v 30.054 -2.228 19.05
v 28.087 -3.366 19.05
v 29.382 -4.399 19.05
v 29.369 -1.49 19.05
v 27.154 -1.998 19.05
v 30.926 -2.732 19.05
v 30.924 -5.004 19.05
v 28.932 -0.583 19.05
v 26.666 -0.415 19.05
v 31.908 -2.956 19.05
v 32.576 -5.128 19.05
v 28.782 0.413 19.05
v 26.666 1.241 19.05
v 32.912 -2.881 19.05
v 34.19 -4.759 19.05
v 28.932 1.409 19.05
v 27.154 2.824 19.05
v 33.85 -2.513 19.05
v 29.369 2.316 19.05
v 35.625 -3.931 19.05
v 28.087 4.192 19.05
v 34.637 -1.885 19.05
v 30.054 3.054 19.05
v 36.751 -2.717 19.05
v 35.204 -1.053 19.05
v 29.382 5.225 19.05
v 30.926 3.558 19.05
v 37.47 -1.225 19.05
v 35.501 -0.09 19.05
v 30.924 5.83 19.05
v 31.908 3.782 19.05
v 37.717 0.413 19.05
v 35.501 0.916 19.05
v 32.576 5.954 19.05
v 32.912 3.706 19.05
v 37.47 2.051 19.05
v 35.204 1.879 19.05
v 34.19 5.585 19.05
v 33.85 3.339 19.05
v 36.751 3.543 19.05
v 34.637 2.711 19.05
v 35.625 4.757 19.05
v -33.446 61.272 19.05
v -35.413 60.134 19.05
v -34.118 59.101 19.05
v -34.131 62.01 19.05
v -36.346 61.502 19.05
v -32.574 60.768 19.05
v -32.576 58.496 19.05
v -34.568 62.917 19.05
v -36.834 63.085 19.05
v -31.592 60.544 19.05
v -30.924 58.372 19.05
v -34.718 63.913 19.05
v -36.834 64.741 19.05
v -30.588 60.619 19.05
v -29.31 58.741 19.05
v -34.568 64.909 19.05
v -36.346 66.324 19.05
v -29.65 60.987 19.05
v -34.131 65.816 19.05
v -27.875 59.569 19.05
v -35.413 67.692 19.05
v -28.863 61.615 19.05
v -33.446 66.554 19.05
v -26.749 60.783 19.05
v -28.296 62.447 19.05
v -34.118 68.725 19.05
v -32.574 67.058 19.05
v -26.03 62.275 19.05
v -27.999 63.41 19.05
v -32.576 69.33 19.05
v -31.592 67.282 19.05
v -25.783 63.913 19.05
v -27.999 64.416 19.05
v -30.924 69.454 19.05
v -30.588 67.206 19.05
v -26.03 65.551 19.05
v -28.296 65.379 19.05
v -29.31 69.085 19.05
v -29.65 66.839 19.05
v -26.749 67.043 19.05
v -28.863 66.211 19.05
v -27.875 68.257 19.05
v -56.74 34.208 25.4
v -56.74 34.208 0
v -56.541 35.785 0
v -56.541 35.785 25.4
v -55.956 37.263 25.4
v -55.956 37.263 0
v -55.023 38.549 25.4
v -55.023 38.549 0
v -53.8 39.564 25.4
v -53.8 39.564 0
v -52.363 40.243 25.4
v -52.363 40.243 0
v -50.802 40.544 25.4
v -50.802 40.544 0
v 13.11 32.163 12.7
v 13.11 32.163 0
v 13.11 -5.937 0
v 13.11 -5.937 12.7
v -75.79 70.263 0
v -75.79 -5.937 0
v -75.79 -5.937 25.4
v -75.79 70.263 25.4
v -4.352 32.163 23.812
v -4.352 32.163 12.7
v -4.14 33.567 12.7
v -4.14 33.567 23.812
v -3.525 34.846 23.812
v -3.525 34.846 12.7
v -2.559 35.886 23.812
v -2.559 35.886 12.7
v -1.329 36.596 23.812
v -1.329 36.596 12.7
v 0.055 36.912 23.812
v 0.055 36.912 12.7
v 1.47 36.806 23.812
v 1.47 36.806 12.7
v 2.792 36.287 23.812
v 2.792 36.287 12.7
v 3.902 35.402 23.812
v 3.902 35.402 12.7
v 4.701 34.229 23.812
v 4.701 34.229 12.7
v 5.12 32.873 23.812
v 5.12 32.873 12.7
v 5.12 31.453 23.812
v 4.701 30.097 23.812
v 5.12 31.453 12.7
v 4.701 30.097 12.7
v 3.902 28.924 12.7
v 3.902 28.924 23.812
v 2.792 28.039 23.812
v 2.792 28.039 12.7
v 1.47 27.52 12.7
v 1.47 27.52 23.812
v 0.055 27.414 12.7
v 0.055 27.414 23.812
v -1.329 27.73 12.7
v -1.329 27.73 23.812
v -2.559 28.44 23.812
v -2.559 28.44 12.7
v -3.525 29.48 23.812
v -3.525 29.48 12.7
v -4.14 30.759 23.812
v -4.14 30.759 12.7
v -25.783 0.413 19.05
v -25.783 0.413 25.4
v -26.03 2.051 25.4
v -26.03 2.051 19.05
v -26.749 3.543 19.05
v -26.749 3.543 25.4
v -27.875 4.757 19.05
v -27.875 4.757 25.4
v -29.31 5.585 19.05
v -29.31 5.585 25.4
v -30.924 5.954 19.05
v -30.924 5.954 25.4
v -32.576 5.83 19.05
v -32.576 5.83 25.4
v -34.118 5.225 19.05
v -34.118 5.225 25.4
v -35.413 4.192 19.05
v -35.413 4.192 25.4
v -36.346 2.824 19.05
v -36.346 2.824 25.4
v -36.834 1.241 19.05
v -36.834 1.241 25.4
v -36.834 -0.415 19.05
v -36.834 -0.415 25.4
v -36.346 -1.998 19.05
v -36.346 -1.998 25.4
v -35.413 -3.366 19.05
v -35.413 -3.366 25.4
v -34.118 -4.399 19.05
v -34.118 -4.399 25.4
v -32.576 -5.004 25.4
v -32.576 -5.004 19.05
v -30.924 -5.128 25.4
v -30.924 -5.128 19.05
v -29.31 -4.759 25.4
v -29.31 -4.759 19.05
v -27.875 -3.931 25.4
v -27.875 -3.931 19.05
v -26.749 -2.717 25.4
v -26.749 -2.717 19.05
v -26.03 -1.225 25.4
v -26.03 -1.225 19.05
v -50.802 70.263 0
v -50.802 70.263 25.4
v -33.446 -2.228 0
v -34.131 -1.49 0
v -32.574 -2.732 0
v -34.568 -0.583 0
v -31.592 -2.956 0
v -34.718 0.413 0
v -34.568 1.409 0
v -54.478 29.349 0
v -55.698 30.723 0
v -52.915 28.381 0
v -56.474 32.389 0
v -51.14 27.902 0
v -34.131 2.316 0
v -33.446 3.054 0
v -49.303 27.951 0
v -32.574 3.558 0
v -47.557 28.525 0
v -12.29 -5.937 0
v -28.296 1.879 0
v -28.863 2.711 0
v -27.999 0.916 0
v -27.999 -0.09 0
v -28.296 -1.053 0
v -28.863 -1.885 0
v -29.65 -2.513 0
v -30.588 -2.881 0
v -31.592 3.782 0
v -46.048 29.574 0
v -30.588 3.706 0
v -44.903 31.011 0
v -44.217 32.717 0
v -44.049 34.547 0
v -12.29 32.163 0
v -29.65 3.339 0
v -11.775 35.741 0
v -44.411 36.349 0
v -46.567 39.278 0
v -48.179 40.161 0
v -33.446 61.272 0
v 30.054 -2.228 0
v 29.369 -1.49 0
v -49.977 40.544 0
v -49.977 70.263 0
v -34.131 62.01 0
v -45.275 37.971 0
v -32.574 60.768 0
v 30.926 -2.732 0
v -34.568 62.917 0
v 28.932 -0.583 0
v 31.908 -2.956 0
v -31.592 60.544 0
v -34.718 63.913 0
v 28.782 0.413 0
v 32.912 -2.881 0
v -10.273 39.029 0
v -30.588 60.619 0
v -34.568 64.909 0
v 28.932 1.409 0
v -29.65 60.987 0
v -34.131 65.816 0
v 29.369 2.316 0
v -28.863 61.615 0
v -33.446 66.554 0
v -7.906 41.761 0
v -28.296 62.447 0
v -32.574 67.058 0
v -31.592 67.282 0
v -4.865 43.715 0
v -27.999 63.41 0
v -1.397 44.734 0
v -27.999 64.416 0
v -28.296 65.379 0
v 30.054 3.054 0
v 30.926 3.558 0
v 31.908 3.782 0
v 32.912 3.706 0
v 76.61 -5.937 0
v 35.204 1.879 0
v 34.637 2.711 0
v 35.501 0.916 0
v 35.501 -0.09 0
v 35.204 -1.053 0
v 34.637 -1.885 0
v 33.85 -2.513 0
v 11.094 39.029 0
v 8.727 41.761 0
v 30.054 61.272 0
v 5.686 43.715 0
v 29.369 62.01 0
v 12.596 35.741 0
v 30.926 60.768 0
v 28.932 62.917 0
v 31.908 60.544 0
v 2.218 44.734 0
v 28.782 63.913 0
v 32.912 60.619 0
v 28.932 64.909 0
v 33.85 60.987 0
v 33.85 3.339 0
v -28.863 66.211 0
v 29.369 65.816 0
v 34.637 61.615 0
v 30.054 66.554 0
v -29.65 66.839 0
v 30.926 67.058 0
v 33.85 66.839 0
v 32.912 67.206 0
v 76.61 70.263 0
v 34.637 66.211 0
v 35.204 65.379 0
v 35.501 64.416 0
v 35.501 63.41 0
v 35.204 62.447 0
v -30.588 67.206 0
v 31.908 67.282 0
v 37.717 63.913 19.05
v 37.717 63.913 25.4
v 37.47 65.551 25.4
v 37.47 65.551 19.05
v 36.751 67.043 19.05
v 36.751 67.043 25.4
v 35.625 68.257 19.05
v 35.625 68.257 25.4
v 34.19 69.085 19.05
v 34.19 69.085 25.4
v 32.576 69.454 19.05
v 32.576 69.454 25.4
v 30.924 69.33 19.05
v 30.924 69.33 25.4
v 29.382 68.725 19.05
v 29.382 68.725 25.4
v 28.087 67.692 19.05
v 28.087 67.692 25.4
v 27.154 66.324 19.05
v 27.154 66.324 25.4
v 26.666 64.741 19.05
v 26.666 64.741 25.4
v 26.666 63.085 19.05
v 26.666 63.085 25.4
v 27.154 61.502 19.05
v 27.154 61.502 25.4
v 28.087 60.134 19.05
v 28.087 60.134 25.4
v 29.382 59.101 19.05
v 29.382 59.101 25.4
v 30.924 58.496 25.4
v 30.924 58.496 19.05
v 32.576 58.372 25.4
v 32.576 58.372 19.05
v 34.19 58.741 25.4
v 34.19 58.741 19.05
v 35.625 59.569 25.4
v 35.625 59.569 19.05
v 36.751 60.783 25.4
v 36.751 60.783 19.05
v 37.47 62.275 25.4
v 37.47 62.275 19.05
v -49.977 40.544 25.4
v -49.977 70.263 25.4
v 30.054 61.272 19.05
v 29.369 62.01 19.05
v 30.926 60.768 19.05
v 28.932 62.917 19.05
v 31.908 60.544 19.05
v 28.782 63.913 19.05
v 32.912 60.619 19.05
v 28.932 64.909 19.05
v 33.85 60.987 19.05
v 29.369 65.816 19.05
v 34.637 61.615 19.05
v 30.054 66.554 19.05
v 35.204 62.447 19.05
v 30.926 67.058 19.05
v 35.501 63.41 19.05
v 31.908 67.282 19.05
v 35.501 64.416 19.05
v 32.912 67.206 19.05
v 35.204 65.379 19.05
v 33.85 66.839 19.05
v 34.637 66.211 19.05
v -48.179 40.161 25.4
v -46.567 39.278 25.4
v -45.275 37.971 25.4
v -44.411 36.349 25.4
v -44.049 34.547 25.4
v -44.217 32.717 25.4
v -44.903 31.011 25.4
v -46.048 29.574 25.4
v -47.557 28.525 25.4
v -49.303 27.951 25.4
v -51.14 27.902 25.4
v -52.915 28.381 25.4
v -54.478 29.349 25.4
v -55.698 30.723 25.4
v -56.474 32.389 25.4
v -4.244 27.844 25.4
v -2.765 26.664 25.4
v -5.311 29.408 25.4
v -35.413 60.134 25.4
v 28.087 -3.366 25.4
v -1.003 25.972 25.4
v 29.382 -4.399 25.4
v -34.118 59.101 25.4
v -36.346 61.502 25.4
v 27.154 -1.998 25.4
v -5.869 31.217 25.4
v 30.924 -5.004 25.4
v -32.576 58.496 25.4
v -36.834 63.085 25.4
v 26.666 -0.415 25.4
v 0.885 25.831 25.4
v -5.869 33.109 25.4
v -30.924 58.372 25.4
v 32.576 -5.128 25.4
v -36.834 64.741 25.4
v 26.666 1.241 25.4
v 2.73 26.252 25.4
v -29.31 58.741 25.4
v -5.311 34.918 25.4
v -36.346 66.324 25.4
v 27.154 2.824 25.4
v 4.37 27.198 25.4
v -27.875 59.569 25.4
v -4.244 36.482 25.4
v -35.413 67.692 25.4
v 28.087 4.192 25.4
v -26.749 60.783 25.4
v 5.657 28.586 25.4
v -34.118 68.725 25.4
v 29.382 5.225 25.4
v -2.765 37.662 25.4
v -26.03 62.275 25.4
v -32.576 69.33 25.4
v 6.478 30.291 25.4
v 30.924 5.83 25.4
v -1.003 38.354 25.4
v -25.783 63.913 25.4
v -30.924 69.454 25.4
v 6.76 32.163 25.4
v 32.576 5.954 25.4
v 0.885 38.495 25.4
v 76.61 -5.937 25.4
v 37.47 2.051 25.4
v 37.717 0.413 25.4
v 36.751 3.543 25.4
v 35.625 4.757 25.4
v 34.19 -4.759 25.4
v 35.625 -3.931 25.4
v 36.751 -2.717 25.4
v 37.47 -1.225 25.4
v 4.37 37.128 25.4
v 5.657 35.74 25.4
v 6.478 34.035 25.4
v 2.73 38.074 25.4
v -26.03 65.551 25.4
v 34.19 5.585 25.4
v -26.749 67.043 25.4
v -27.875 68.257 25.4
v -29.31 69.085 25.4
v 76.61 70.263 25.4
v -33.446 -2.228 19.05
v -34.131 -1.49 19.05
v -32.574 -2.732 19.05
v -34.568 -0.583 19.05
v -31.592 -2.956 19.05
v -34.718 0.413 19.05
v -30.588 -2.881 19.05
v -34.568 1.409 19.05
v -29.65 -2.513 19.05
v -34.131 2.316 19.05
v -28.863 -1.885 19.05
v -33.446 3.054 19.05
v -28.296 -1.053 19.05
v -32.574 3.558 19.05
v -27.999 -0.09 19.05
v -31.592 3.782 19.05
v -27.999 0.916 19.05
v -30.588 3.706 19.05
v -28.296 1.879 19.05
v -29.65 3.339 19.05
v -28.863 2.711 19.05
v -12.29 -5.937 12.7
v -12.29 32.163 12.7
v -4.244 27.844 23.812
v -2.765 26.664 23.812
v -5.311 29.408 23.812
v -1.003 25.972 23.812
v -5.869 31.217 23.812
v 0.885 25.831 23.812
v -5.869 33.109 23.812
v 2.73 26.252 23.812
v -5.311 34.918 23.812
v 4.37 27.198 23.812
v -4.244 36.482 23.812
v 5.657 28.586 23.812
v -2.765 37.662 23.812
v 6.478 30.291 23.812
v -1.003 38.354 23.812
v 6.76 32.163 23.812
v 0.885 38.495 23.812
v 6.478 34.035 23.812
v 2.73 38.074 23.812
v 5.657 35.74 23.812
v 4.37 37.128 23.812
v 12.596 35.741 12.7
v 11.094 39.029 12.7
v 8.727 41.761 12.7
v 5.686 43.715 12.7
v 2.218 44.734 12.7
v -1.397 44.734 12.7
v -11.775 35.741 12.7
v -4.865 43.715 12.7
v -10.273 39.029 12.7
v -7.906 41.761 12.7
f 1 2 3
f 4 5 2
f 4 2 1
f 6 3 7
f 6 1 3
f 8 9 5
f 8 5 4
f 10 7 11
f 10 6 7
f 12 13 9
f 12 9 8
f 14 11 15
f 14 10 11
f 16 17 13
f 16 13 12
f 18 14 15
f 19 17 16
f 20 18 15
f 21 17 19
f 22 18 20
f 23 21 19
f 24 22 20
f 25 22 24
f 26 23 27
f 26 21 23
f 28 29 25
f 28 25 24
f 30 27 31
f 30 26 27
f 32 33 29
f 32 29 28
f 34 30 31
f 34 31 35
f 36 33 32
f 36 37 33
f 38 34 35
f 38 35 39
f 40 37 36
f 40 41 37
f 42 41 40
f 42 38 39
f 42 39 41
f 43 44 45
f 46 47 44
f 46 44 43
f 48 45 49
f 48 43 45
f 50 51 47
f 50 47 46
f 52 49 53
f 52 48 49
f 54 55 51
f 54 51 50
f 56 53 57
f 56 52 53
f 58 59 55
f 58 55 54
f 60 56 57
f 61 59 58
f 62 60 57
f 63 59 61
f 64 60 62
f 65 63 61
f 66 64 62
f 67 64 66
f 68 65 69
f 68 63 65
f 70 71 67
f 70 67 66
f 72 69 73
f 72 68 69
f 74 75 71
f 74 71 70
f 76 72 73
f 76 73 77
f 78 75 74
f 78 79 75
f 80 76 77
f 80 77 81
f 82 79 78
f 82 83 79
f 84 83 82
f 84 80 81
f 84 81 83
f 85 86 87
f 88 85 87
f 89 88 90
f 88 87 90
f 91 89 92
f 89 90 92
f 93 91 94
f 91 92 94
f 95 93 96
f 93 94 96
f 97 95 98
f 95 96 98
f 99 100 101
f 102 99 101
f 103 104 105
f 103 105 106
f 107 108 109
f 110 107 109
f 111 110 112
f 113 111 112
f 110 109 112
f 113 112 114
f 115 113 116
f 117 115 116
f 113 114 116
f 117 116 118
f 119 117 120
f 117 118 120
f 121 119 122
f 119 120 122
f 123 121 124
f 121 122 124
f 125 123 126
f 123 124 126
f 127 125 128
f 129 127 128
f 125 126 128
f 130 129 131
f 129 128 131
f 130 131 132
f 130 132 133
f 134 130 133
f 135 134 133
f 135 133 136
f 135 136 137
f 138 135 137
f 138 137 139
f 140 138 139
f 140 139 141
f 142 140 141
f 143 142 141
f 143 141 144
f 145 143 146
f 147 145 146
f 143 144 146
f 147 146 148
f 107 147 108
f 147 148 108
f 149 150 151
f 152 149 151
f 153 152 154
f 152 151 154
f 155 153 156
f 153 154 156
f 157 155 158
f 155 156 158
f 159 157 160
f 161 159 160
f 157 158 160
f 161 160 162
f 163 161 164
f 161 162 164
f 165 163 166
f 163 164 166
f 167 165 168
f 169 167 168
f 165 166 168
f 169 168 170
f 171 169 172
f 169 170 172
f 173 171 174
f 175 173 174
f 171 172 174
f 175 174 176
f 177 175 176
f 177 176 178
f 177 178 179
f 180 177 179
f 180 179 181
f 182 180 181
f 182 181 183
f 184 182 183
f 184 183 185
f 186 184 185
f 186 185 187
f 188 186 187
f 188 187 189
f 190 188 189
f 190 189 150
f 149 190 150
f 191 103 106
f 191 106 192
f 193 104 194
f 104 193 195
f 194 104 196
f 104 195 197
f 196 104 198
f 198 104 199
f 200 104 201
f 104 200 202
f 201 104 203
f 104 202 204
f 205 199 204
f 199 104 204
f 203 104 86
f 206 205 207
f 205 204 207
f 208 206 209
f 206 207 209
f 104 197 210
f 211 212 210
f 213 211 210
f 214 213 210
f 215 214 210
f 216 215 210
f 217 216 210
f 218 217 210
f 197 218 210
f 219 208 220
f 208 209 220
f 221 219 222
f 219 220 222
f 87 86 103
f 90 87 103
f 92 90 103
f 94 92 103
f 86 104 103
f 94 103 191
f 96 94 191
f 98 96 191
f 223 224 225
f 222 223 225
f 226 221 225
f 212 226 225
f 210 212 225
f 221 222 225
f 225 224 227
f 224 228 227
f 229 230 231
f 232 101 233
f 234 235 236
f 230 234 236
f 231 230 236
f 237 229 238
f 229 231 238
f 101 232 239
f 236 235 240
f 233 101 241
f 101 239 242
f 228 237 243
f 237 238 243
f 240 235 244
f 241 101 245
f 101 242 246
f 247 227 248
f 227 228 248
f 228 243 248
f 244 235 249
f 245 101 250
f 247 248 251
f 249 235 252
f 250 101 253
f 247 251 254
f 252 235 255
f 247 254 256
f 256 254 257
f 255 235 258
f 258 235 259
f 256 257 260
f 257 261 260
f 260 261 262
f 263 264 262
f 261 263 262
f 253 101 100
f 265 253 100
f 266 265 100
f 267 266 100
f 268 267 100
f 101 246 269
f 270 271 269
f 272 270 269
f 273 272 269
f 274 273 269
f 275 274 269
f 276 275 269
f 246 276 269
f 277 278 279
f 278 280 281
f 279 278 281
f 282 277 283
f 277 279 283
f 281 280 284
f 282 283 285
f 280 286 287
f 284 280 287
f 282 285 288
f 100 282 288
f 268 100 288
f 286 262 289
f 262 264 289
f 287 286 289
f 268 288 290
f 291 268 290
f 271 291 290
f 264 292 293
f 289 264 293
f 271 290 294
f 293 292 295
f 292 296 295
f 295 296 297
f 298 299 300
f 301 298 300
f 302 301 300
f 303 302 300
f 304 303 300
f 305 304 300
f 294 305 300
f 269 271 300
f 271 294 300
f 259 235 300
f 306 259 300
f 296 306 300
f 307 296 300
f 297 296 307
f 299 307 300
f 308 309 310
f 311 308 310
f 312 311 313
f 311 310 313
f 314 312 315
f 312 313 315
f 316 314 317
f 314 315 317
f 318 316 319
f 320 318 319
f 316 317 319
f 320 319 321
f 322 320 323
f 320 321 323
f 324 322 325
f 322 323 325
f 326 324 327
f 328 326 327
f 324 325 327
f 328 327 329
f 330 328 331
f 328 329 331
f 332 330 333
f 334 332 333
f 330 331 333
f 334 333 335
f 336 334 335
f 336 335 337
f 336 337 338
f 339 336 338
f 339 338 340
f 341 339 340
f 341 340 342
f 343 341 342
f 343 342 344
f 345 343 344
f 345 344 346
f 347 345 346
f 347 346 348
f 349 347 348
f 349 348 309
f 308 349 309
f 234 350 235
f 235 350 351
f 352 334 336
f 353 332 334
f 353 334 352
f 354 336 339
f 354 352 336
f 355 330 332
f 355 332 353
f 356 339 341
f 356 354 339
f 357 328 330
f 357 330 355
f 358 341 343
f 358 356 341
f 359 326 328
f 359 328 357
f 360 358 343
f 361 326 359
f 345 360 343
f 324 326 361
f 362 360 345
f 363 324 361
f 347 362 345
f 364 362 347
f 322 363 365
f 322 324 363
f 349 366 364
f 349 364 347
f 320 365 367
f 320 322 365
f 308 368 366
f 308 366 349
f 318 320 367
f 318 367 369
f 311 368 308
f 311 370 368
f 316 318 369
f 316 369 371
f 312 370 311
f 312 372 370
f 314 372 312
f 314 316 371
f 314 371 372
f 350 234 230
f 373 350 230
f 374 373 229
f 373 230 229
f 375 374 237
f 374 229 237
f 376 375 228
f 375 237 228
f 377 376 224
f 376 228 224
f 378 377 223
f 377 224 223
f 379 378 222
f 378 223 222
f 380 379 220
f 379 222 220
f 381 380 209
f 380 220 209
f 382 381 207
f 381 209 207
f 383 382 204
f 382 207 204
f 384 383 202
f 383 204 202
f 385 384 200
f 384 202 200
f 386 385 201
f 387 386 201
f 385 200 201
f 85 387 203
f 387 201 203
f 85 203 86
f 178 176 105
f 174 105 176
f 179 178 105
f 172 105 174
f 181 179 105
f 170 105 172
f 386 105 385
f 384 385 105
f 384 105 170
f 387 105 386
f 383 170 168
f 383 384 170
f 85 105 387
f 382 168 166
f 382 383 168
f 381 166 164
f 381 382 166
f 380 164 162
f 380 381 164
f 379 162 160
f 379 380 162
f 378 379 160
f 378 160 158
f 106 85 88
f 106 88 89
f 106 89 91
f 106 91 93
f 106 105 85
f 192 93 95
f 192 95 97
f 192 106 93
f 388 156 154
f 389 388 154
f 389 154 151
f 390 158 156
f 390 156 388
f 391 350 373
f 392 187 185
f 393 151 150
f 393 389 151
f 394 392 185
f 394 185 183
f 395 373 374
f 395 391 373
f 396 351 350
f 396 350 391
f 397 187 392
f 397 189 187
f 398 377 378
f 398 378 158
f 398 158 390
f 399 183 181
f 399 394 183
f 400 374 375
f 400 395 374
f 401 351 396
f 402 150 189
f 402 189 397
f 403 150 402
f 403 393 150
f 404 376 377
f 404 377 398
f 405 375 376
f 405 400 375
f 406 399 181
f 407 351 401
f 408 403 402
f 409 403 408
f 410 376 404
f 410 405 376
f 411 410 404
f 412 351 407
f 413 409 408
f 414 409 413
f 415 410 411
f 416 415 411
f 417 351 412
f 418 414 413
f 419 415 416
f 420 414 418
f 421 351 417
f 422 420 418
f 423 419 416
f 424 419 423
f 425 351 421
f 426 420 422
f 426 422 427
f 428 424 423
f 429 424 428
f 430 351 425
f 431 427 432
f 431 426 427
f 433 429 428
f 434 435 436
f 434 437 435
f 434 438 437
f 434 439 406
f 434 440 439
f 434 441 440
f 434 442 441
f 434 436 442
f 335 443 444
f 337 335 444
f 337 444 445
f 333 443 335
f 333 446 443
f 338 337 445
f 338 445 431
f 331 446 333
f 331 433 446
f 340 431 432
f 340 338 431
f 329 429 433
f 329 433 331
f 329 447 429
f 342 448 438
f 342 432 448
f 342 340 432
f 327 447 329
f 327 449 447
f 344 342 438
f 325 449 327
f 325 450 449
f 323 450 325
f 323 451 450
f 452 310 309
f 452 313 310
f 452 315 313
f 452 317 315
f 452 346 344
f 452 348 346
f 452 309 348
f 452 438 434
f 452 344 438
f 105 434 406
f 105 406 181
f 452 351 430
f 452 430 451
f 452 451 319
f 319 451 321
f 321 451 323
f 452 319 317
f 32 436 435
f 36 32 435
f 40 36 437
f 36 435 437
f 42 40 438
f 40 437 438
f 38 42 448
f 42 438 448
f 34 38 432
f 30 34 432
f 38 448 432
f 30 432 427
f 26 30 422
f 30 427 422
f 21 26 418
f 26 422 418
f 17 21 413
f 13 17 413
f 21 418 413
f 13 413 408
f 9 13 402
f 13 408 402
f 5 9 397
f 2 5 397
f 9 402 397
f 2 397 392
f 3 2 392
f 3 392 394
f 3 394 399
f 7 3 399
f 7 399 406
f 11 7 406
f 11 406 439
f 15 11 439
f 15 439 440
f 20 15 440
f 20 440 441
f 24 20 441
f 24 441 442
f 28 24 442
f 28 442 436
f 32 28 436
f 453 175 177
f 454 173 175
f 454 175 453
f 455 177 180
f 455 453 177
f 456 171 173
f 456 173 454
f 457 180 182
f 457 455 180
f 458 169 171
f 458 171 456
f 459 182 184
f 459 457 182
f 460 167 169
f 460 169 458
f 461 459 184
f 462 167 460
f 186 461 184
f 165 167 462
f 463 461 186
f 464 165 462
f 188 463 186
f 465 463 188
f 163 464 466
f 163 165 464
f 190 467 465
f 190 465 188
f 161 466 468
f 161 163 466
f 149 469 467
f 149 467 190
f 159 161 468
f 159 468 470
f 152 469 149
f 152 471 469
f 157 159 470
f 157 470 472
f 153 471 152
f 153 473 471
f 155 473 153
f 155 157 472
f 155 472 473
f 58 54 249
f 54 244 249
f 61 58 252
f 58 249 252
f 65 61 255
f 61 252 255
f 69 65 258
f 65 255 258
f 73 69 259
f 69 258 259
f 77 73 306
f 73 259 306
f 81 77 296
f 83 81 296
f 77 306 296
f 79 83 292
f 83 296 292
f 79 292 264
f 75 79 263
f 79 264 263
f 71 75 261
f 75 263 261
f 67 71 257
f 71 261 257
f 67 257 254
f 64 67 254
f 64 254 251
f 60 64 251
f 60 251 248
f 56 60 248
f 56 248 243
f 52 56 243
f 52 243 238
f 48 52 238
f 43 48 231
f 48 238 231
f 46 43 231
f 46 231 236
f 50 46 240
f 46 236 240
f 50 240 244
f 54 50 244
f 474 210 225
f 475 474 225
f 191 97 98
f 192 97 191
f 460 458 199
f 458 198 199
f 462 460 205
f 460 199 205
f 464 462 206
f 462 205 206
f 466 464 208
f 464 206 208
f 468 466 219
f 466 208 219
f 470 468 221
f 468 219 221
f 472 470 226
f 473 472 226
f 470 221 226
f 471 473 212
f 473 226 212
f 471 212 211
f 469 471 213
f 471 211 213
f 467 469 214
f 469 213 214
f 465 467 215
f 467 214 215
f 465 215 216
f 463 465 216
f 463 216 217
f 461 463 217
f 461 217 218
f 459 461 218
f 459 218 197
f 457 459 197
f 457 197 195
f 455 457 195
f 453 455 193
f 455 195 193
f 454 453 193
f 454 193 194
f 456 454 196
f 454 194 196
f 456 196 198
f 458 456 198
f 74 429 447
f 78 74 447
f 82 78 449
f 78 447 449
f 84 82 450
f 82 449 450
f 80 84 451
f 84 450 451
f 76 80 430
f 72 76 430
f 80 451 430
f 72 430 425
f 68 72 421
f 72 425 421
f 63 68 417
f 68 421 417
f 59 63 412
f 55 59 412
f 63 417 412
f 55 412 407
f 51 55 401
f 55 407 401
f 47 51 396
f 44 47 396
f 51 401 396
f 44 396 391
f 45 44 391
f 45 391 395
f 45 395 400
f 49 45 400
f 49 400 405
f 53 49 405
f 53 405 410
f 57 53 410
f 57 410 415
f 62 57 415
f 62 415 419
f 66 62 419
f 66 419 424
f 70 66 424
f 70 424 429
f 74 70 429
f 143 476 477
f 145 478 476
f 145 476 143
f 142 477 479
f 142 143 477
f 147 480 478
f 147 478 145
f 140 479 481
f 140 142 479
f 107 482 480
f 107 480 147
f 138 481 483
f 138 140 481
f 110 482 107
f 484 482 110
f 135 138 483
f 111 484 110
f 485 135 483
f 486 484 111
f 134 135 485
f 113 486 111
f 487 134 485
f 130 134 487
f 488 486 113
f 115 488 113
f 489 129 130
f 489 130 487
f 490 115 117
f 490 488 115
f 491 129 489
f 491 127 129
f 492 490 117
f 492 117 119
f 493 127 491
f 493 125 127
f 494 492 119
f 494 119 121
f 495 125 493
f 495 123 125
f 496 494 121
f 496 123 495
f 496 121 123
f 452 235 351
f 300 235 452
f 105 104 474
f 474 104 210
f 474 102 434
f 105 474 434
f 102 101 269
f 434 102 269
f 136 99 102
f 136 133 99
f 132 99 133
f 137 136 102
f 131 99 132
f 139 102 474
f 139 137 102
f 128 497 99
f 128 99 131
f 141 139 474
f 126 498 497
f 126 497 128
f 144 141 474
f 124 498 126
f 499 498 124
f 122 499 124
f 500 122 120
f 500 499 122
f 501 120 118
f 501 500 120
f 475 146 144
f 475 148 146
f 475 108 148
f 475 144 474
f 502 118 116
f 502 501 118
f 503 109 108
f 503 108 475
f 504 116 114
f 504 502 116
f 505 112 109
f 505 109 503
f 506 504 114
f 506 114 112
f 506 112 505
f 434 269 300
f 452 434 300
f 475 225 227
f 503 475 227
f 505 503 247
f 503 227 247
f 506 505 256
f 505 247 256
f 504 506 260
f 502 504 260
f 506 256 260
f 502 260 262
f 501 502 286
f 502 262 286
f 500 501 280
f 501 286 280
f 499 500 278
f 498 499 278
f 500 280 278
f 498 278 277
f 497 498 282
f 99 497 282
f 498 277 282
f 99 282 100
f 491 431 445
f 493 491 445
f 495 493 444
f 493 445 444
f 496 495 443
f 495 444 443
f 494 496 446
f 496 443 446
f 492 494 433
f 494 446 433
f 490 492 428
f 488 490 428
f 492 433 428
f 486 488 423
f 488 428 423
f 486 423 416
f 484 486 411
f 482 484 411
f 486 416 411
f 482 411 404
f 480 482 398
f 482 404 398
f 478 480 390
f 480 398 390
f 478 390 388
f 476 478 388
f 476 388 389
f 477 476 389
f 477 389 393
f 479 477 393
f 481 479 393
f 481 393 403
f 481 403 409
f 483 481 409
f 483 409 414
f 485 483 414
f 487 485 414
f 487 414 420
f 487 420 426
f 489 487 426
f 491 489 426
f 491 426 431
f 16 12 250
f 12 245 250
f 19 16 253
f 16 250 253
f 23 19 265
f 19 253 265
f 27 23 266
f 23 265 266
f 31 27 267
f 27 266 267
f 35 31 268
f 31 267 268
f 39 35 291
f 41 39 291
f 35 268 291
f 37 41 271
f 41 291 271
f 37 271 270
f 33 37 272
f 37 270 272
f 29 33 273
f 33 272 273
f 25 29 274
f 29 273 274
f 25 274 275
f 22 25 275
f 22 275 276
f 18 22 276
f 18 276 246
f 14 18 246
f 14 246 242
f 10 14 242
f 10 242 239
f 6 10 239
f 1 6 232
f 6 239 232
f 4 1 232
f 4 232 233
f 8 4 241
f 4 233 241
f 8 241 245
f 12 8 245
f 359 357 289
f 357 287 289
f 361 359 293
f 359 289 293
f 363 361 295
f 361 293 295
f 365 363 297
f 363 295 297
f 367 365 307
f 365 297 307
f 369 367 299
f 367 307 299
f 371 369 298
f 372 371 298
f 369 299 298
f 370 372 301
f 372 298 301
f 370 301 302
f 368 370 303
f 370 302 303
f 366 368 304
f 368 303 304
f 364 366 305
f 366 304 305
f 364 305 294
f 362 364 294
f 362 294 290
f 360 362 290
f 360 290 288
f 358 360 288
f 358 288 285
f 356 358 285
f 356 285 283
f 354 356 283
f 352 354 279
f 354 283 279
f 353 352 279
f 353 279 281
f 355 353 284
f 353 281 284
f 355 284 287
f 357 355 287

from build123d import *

# Parameters (mm, degrees)
SKETCH1_W                                        = 152.4
SKETCH1_H                                        = 76.2
BOSS_EXTRUDE1_DEPTH                              = 25.4
HOLE1_D                                          = 9.525
HOLE1_CBORE_D                                    = 12.7
HOLE1_CBORE_DEPTH                                = 1.5875
F_1_2_0_5_DIAMETER_HOLE1_D                       = 12.7
CBORE_FOR_1_4_SOCKET_HEAD_CAP_SCREW1_D           = 6.7564
CBORE_FOR_1_4_SOCKET_HEAD_CAP_SCREW1_CBORE_D     = 11.1125
CBORE_FOR_1_4_SOCKET_HEAD_CAP_SCREW1_CBORE_DEPTH = 6.35
CUT_EXTRUDE2_DEPTH                               = 12.7
SKETCH22_W                                       = 0.8255
SKETCH22_H                                       = 29.718728574
CUT_EXTRUDE4_DEPTH                               = 108.010322277


with BuildPart() as part:
    # Sketch1 → Boss-Extrude1 (new body)
    with BuildSketch(Plane.XY):
        with Locations((0.410445336, 32.162996942)):
            Rectangle(SKETCH1_W, SKETCH1_H)
    extrude(amount=BOSS_EXTRUDE1_DEPTH)

    # Hole1 (through all)
    with Locations(Plane.XY.offset(25.4)):
        with Locations((0.410445336, 32.162996942)):
            CounterBoreHole(HOLE1_D / 2, HOLE1_CBORE_D / 2, HOLE1_CBORE_DEPTH)

    # 1/2 (0.5) Diameter Hole1 (through all)
    with Locations(Plane.XY.offset(25.4)):
        with Locations((-50.389554664, 34.207696942)):
            Hole(F_1_2_0_5_DIAMETER_HOLE1_D / 2)

    # CBORE for 1/4 Socket Head Cap Screw1 (through all)
    with Locations(Plane.XY.offset(25.4)):
        with Locations((-31.339554664, 63.912996942), (-31.339554664, 0.412996942), (32.160445336, 0.412996942), (32.160445336, 63.912996942)):
            CounterBoreHole(CBORE_FOR_1_4_SOCKET_HEAD_CAP_SCREW1_D / 2, CBORE_FOR_1_4_SOCKET_HEAD_CAP_SCREW1_CBORE_D / 2, CBORE_FOR_1_4_SOCKET_HEAD_CAP_SCREW1_CBORE_DEPTH)

    # Sketch14 → Cut-Extrude2 (cut)
    with BuildSketch(Plane(origin=(0, 0, 0), x_dir=(-1, 0, 0), z_dir=(0, 0, -1))):
        with BuildLine():
            Line((-13.110445336, 32.162996942), (-13.110445336, -5.937003058))
            Line((-13.110445336, -5.937003058), (12.289554664, -5.937003058))
            Line((12.289554664, -5.937003058), (12.289554664, 32.162996942))
            ThreePointArc((12.289554664, 32.162996942), (-0.410445336, 44.862996942), (-13.110445336, 32.162996942))
        make_face()
    extrude(amount=-CUT_EXTRUDE2_DEPTH, mode=Mode.SUBTRACT)

    # Sketch22 → Cut-Extrude4 (cut, through all)
    with BuildSketch(Plane.XY.offset(25.4)):
        with Locations((-50.389554664, 55.403632655)):
            Rectangle(SKETCH22_W, SKETCH22_H)
    extrude(amount=-CUT_EXTRUDE4_DEPTH, mode=Mode.SUBTRACT)


solid = part.part
